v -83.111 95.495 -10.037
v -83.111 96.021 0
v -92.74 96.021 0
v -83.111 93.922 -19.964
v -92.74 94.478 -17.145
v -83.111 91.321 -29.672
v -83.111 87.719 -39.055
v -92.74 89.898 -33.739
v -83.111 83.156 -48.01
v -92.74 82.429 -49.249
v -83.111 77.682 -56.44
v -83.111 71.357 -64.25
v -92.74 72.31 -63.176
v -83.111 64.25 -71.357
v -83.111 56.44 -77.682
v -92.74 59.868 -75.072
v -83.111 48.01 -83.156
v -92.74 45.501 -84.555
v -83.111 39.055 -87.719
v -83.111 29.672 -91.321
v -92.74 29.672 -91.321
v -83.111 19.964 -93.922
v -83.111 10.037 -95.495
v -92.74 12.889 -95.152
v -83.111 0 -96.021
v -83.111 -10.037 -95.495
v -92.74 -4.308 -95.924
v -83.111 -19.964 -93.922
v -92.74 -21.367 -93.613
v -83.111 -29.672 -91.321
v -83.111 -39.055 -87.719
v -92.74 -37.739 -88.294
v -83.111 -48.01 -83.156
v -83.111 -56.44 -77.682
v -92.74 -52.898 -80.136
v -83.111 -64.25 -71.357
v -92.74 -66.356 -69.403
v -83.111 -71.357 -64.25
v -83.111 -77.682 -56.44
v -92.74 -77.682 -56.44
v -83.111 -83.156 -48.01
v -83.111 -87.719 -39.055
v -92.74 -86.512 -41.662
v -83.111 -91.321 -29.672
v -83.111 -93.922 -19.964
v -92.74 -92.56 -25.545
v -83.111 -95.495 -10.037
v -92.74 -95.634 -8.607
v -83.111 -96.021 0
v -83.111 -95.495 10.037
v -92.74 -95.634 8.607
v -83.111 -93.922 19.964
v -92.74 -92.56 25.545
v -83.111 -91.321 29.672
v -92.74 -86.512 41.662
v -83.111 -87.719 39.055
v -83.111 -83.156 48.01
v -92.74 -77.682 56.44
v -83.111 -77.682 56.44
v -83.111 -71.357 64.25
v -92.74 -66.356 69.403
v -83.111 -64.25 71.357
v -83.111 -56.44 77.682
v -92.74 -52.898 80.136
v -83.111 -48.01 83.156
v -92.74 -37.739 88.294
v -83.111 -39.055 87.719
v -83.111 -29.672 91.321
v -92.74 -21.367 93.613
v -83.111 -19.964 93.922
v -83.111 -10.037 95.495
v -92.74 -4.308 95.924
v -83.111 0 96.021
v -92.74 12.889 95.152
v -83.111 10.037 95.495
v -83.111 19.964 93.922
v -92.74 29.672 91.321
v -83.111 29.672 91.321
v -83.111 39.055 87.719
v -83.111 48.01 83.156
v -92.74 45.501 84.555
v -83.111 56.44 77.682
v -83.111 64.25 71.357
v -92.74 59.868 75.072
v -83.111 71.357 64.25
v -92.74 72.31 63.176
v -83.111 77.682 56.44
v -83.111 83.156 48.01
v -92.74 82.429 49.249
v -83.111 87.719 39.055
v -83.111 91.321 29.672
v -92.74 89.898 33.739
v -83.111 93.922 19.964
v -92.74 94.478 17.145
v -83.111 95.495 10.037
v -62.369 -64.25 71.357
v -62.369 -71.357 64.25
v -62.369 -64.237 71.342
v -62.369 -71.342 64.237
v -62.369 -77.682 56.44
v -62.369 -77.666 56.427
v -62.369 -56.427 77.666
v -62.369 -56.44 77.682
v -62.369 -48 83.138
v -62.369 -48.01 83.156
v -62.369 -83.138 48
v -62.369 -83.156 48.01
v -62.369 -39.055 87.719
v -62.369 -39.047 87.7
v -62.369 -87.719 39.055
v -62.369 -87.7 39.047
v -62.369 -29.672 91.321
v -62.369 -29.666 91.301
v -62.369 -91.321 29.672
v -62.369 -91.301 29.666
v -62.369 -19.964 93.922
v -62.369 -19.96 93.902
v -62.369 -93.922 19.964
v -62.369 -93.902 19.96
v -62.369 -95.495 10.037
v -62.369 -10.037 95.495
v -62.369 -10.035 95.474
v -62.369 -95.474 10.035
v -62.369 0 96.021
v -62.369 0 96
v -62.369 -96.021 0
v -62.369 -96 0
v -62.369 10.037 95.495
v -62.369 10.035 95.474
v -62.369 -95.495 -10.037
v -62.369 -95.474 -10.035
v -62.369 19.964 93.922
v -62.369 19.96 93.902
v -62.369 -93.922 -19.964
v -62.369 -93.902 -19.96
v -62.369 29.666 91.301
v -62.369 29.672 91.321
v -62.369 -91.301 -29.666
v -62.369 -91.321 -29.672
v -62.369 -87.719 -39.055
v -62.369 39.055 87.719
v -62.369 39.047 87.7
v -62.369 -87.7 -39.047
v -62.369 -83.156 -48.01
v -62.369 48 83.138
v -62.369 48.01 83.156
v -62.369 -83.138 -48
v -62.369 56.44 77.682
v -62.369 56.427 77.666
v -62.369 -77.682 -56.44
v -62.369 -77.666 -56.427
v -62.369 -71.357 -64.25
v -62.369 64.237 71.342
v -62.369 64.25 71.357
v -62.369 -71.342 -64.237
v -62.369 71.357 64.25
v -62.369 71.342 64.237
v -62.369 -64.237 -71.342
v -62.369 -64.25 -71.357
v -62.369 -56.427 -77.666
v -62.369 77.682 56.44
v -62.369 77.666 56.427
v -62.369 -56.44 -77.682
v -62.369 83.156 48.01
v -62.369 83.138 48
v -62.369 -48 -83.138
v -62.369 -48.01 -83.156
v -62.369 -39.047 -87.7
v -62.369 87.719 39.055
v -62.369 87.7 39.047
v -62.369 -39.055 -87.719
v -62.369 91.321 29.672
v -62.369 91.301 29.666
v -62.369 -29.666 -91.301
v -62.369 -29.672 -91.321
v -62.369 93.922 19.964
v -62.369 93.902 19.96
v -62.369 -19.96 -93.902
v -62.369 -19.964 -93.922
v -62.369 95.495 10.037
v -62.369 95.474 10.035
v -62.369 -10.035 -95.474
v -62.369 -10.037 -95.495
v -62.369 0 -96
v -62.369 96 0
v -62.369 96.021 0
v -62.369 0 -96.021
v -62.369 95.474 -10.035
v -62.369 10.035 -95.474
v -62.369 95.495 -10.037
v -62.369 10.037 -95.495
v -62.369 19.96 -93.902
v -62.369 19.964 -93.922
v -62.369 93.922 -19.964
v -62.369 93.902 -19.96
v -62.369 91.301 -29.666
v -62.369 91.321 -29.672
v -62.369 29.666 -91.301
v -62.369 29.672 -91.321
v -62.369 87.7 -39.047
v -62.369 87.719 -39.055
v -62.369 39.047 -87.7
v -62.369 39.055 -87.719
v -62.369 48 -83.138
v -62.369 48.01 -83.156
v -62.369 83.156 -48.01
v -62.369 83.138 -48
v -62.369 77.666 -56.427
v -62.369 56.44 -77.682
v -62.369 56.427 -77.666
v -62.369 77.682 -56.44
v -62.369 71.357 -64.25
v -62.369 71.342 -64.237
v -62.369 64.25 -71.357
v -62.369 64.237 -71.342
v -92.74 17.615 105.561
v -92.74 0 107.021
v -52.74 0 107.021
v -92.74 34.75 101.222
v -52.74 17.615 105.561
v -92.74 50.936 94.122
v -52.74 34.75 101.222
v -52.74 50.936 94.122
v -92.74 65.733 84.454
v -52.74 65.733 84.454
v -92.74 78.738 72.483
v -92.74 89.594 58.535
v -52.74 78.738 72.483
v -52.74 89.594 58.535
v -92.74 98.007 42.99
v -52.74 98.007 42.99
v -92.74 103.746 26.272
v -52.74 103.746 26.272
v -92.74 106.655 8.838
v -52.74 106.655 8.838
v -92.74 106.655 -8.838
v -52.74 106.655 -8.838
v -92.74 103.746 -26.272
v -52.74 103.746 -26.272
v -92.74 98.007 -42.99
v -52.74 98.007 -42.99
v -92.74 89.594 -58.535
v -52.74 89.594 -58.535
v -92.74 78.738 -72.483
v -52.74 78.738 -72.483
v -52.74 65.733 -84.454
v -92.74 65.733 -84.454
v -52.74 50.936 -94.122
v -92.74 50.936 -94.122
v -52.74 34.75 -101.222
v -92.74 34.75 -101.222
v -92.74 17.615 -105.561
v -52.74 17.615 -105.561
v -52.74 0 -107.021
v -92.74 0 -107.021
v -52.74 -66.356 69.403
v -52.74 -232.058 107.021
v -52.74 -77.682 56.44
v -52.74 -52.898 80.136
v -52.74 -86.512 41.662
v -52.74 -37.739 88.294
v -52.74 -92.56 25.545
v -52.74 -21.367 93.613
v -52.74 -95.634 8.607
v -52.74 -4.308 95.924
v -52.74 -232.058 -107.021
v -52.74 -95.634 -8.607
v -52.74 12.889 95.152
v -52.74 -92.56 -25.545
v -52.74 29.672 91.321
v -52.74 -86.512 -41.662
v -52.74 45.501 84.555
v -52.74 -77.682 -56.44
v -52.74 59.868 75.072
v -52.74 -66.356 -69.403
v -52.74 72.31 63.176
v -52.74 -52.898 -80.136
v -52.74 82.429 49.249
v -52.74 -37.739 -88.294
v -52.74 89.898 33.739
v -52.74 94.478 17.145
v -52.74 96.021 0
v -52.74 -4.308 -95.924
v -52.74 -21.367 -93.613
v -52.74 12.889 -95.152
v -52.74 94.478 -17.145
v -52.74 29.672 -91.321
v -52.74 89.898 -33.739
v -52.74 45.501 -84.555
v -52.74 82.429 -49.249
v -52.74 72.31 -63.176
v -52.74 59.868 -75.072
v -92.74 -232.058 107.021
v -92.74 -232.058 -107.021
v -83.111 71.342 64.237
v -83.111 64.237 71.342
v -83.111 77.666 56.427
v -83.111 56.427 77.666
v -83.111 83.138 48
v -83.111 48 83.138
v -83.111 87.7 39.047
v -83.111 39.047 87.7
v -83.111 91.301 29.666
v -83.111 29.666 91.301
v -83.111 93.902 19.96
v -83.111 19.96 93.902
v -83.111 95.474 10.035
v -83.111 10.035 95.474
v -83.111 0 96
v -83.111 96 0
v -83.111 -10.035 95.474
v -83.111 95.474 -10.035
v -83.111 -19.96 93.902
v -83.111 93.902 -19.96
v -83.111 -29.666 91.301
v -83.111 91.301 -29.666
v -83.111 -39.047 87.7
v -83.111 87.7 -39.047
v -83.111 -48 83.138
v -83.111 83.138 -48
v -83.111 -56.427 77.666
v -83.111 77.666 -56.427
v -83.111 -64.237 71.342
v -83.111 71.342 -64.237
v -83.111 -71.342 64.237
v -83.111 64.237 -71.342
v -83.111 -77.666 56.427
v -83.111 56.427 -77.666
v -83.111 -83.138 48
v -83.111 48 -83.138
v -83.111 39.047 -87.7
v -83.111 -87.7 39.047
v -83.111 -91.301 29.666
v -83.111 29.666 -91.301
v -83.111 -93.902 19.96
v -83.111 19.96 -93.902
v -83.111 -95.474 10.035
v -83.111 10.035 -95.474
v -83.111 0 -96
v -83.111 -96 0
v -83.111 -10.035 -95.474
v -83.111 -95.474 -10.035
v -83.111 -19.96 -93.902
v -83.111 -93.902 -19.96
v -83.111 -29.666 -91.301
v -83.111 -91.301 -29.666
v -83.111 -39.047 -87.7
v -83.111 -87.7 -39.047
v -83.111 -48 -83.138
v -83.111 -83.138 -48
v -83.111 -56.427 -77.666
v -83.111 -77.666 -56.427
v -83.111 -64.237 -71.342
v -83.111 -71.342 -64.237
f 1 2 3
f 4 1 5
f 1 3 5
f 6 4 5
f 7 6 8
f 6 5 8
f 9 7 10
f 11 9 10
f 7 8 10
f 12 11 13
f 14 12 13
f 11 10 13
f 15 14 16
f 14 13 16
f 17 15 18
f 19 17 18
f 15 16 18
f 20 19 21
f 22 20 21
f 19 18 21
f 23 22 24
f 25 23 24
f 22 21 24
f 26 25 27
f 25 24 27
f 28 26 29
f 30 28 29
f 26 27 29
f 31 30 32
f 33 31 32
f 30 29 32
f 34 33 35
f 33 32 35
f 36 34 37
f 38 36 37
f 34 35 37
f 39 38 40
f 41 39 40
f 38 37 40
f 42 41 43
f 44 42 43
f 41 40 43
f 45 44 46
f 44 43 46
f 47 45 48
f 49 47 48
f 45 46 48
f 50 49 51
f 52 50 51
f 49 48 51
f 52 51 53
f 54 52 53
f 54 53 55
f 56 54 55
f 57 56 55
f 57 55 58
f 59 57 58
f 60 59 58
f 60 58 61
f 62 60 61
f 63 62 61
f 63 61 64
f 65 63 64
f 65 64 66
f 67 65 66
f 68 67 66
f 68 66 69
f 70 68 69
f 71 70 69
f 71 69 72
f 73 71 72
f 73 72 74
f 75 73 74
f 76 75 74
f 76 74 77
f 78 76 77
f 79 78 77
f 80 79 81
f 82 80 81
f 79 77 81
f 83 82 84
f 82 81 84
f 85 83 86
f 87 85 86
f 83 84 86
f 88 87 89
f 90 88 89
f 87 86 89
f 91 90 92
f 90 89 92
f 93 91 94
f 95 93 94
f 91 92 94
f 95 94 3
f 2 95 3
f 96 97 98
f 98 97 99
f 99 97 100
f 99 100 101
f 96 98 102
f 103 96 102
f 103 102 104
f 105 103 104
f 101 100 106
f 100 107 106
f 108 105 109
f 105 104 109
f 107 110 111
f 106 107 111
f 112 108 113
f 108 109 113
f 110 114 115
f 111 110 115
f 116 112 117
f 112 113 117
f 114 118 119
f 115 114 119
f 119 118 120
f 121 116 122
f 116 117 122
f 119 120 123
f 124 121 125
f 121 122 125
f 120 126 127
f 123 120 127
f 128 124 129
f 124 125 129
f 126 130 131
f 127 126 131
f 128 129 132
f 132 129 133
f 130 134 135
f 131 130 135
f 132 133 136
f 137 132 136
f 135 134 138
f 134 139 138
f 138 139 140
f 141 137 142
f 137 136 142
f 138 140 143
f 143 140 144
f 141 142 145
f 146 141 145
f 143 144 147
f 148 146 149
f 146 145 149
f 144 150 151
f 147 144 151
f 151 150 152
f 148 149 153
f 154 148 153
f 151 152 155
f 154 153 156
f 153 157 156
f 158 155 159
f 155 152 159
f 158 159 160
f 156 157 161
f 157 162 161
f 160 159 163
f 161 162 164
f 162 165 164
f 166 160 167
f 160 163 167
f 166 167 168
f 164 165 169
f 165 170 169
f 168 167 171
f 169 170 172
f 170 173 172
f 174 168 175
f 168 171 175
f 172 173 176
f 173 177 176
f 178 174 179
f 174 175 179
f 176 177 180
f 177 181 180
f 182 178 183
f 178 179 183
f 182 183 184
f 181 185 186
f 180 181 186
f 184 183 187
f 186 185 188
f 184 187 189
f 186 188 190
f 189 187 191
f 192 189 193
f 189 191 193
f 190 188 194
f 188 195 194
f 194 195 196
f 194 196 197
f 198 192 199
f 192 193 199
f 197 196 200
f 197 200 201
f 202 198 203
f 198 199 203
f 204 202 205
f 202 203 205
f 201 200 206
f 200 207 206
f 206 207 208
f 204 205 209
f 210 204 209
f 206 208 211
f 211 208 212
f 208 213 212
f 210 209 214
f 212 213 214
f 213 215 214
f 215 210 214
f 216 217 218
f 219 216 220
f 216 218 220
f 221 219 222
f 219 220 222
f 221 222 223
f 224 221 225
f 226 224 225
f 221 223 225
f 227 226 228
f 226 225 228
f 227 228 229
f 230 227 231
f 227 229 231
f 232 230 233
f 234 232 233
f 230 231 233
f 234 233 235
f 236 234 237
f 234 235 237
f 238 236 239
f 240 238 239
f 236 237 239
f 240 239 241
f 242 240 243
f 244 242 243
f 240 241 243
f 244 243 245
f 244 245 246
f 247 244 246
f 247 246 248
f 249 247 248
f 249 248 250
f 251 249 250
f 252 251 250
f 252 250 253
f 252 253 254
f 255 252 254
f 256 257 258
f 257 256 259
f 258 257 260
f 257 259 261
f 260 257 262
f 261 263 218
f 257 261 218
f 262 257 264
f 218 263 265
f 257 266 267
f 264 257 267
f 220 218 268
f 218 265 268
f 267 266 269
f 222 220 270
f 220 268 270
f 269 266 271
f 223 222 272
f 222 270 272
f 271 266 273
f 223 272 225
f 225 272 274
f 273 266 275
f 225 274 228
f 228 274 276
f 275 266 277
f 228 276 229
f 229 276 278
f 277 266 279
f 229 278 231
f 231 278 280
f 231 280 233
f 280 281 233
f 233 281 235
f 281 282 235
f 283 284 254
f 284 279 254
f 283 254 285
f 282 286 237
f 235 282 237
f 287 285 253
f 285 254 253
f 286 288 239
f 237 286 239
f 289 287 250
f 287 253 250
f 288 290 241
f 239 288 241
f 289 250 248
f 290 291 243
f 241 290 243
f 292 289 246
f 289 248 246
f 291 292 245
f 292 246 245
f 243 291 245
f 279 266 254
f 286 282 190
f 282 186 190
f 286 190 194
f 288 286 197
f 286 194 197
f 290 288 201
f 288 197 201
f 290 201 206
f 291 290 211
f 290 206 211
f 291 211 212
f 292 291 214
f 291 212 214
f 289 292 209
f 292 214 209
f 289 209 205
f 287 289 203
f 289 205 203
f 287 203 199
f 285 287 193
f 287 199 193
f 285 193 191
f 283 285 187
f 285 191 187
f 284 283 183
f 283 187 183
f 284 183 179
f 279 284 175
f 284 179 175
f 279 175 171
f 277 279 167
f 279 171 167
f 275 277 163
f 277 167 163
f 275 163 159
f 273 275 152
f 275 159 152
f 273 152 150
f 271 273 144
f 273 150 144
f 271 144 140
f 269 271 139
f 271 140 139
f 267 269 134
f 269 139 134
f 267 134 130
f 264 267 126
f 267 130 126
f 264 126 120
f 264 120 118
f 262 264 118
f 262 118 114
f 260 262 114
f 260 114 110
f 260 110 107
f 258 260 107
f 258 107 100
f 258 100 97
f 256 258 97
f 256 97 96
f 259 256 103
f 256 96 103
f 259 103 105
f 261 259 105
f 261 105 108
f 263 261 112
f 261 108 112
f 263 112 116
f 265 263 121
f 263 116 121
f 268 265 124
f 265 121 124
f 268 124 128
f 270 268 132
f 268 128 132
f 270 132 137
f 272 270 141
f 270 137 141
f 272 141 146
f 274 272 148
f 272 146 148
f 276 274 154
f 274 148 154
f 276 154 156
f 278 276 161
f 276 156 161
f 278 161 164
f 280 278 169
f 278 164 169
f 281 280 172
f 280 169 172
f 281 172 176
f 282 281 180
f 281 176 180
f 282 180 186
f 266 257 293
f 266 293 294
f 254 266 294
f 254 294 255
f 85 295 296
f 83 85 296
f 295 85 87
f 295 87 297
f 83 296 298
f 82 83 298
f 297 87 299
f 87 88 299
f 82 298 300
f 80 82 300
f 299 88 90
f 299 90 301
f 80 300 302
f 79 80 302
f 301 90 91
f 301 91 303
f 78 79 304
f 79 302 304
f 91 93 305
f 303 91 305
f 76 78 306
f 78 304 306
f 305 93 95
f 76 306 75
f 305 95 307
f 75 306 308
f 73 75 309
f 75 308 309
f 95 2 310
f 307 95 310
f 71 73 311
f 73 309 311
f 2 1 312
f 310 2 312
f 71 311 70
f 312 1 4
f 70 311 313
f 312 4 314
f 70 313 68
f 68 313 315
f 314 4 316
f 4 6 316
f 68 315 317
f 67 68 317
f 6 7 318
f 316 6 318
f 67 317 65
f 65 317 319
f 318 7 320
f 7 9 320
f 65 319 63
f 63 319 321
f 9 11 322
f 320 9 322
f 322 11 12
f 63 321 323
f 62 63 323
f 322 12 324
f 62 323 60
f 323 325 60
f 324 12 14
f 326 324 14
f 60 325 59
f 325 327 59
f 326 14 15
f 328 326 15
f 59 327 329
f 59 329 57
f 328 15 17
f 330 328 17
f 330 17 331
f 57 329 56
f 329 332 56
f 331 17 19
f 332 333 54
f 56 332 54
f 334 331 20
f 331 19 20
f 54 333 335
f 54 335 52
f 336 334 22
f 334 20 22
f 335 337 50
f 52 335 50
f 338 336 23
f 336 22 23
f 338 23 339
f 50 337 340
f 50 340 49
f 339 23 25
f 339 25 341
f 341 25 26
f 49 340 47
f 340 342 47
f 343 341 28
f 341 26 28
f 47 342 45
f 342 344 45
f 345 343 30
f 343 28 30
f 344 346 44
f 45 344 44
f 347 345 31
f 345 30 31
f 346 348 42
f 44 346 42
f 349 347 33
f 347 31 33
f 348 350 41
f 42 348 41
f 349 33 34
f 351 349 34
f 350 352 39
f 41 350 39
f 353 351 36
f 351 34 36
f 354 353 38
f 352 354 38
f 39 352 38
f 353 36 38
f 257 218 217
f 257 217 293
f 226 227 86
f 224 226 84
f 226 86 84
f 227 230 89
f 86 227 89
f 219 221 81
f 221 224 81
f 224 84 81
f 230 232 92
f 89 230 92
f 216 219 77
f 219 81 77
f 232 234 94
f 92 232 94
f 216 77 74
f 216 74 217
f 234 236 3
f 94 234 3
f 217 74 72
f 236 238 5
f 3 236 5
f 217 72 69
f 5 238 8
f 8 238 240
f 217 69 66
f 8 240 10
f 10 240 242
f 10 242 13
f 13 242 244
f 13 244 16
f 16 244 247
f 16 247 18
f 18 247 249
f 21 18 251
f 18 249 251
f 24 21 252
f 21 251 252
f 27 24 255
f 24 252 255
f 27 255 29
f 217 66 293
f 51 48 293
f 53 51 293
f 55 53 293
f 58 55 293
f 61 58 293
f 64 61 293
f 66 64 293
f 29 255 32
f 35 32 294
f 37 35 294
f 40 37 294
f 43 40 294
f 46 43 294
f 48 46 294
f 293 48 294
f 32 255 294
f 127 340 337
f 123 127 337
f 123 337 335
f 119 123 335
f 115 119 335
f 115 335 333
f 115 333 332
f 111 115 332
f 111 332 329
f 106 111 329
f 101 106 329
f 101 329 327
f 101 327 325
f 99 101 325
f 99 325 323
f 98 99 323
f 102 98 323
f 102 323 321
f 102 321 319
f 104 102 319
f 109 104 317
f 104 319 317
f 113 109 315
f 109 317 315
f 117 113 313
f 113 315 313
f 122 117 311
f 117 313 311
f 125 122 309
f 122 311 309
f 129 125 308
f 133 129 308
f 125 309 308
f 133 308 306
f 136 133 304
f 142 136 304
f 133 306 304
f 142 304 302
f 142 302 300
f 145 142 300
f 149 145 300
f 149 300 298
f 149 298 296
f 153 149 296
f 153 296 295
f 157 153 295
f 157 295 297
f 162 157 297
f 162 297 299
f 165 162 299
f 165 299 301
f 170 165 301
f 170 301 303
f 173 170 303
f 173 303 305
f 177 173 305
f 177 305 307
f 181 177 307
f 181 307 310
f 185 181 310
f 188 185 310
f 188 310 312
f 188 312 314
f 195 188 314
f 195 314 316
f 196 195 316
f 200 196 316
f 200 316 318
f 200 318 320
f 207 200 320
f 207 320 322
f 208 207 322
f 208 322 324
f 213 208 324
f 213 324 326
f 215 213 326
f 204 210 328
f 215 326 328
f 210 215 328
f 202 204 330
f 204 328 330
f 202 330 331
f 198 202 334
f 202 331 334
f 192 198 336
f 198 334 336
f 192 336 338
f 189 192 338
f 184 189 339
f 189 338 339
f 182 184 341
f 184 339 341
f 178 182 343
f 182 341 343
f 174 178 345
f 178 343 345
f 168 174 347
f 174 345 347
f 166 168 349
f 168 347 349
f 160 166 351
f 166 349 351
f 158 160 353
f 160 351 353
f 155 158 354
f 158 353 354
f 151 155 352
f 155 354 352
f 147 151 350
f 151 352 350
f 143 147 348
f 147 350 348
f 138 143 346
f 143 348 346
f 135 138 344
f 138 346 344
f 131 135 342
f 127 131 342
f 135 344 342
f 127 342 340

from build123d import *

# Parameters (mm, degrees)
DODANIE_WYCI_GNI_CIE1_START = -40
DODANIE_WYCI_GNI_CIE1_DEPTH = 40
SZKIC4_R                    = 96
WYTNIJ_WYCI_GNI_CIE1_DEPTH  = 40


with BuildPart() as part:
    # Szkic1 → Obrót1 (revolve)
    with BuildSketch(Plane.XY):
        Polygon((-52.739893705, 77.020736352), (-92.739893705, 77.020736352), (-92.739893705, 88.020736352), (-83.110941126, 88.020736352), (-83.110941126, 96.020736352), (-92.739893705, 96.020736352), (-92.739893705, 107.020736352), (-52.739893705, 107.020736352), (-52.739893705, 96.020736352), (-62.368846284, 96.020736352), (-62.368846284, 88.020736352), (-52.739893705, 88.020736352), align=None)
    revolve(axis=Axis((0, 0, 0), (-1, 0, 0)))

    # Szkic2 → Dodanie-wyciągnięcie1 (add)
    with BuildSketch(Plane.ZY.offset(92.739893705).offset(DODANIE_WYCI_GNI_CIE1_START)):
        with BuildLine():
            ThreePointArc((-107.020736352, 0), (0, -107.020736352), (107.020736352, 0))
            Line((107.020736352, 0), (107.020736352, -232.057883899))
            Line((107.020736352, -232.057883899), (-107.020736352, -232.057883899))
            Line((-107.020736352, -232.057883899), (-107.020736352, 0))
        make_face()
    extrude(amount=DODANIE_WYCI_GNI_CIE1_DEPTH)

    # Szkic4 → Wytnij-wyciągnięcie1 (cut)
    with BuildSketch(Plane.ZY.offset(92.739893705)):
        with Locations(Location((0, 0, 0), (0, 0, 270))):
            Circle(SZKIC4_R)
    extrude(amount=-WYTNIJ_WYCI_GNI_CIE1_DEPTH, mode=Mode.SUBTRACT)


solid = part.part
